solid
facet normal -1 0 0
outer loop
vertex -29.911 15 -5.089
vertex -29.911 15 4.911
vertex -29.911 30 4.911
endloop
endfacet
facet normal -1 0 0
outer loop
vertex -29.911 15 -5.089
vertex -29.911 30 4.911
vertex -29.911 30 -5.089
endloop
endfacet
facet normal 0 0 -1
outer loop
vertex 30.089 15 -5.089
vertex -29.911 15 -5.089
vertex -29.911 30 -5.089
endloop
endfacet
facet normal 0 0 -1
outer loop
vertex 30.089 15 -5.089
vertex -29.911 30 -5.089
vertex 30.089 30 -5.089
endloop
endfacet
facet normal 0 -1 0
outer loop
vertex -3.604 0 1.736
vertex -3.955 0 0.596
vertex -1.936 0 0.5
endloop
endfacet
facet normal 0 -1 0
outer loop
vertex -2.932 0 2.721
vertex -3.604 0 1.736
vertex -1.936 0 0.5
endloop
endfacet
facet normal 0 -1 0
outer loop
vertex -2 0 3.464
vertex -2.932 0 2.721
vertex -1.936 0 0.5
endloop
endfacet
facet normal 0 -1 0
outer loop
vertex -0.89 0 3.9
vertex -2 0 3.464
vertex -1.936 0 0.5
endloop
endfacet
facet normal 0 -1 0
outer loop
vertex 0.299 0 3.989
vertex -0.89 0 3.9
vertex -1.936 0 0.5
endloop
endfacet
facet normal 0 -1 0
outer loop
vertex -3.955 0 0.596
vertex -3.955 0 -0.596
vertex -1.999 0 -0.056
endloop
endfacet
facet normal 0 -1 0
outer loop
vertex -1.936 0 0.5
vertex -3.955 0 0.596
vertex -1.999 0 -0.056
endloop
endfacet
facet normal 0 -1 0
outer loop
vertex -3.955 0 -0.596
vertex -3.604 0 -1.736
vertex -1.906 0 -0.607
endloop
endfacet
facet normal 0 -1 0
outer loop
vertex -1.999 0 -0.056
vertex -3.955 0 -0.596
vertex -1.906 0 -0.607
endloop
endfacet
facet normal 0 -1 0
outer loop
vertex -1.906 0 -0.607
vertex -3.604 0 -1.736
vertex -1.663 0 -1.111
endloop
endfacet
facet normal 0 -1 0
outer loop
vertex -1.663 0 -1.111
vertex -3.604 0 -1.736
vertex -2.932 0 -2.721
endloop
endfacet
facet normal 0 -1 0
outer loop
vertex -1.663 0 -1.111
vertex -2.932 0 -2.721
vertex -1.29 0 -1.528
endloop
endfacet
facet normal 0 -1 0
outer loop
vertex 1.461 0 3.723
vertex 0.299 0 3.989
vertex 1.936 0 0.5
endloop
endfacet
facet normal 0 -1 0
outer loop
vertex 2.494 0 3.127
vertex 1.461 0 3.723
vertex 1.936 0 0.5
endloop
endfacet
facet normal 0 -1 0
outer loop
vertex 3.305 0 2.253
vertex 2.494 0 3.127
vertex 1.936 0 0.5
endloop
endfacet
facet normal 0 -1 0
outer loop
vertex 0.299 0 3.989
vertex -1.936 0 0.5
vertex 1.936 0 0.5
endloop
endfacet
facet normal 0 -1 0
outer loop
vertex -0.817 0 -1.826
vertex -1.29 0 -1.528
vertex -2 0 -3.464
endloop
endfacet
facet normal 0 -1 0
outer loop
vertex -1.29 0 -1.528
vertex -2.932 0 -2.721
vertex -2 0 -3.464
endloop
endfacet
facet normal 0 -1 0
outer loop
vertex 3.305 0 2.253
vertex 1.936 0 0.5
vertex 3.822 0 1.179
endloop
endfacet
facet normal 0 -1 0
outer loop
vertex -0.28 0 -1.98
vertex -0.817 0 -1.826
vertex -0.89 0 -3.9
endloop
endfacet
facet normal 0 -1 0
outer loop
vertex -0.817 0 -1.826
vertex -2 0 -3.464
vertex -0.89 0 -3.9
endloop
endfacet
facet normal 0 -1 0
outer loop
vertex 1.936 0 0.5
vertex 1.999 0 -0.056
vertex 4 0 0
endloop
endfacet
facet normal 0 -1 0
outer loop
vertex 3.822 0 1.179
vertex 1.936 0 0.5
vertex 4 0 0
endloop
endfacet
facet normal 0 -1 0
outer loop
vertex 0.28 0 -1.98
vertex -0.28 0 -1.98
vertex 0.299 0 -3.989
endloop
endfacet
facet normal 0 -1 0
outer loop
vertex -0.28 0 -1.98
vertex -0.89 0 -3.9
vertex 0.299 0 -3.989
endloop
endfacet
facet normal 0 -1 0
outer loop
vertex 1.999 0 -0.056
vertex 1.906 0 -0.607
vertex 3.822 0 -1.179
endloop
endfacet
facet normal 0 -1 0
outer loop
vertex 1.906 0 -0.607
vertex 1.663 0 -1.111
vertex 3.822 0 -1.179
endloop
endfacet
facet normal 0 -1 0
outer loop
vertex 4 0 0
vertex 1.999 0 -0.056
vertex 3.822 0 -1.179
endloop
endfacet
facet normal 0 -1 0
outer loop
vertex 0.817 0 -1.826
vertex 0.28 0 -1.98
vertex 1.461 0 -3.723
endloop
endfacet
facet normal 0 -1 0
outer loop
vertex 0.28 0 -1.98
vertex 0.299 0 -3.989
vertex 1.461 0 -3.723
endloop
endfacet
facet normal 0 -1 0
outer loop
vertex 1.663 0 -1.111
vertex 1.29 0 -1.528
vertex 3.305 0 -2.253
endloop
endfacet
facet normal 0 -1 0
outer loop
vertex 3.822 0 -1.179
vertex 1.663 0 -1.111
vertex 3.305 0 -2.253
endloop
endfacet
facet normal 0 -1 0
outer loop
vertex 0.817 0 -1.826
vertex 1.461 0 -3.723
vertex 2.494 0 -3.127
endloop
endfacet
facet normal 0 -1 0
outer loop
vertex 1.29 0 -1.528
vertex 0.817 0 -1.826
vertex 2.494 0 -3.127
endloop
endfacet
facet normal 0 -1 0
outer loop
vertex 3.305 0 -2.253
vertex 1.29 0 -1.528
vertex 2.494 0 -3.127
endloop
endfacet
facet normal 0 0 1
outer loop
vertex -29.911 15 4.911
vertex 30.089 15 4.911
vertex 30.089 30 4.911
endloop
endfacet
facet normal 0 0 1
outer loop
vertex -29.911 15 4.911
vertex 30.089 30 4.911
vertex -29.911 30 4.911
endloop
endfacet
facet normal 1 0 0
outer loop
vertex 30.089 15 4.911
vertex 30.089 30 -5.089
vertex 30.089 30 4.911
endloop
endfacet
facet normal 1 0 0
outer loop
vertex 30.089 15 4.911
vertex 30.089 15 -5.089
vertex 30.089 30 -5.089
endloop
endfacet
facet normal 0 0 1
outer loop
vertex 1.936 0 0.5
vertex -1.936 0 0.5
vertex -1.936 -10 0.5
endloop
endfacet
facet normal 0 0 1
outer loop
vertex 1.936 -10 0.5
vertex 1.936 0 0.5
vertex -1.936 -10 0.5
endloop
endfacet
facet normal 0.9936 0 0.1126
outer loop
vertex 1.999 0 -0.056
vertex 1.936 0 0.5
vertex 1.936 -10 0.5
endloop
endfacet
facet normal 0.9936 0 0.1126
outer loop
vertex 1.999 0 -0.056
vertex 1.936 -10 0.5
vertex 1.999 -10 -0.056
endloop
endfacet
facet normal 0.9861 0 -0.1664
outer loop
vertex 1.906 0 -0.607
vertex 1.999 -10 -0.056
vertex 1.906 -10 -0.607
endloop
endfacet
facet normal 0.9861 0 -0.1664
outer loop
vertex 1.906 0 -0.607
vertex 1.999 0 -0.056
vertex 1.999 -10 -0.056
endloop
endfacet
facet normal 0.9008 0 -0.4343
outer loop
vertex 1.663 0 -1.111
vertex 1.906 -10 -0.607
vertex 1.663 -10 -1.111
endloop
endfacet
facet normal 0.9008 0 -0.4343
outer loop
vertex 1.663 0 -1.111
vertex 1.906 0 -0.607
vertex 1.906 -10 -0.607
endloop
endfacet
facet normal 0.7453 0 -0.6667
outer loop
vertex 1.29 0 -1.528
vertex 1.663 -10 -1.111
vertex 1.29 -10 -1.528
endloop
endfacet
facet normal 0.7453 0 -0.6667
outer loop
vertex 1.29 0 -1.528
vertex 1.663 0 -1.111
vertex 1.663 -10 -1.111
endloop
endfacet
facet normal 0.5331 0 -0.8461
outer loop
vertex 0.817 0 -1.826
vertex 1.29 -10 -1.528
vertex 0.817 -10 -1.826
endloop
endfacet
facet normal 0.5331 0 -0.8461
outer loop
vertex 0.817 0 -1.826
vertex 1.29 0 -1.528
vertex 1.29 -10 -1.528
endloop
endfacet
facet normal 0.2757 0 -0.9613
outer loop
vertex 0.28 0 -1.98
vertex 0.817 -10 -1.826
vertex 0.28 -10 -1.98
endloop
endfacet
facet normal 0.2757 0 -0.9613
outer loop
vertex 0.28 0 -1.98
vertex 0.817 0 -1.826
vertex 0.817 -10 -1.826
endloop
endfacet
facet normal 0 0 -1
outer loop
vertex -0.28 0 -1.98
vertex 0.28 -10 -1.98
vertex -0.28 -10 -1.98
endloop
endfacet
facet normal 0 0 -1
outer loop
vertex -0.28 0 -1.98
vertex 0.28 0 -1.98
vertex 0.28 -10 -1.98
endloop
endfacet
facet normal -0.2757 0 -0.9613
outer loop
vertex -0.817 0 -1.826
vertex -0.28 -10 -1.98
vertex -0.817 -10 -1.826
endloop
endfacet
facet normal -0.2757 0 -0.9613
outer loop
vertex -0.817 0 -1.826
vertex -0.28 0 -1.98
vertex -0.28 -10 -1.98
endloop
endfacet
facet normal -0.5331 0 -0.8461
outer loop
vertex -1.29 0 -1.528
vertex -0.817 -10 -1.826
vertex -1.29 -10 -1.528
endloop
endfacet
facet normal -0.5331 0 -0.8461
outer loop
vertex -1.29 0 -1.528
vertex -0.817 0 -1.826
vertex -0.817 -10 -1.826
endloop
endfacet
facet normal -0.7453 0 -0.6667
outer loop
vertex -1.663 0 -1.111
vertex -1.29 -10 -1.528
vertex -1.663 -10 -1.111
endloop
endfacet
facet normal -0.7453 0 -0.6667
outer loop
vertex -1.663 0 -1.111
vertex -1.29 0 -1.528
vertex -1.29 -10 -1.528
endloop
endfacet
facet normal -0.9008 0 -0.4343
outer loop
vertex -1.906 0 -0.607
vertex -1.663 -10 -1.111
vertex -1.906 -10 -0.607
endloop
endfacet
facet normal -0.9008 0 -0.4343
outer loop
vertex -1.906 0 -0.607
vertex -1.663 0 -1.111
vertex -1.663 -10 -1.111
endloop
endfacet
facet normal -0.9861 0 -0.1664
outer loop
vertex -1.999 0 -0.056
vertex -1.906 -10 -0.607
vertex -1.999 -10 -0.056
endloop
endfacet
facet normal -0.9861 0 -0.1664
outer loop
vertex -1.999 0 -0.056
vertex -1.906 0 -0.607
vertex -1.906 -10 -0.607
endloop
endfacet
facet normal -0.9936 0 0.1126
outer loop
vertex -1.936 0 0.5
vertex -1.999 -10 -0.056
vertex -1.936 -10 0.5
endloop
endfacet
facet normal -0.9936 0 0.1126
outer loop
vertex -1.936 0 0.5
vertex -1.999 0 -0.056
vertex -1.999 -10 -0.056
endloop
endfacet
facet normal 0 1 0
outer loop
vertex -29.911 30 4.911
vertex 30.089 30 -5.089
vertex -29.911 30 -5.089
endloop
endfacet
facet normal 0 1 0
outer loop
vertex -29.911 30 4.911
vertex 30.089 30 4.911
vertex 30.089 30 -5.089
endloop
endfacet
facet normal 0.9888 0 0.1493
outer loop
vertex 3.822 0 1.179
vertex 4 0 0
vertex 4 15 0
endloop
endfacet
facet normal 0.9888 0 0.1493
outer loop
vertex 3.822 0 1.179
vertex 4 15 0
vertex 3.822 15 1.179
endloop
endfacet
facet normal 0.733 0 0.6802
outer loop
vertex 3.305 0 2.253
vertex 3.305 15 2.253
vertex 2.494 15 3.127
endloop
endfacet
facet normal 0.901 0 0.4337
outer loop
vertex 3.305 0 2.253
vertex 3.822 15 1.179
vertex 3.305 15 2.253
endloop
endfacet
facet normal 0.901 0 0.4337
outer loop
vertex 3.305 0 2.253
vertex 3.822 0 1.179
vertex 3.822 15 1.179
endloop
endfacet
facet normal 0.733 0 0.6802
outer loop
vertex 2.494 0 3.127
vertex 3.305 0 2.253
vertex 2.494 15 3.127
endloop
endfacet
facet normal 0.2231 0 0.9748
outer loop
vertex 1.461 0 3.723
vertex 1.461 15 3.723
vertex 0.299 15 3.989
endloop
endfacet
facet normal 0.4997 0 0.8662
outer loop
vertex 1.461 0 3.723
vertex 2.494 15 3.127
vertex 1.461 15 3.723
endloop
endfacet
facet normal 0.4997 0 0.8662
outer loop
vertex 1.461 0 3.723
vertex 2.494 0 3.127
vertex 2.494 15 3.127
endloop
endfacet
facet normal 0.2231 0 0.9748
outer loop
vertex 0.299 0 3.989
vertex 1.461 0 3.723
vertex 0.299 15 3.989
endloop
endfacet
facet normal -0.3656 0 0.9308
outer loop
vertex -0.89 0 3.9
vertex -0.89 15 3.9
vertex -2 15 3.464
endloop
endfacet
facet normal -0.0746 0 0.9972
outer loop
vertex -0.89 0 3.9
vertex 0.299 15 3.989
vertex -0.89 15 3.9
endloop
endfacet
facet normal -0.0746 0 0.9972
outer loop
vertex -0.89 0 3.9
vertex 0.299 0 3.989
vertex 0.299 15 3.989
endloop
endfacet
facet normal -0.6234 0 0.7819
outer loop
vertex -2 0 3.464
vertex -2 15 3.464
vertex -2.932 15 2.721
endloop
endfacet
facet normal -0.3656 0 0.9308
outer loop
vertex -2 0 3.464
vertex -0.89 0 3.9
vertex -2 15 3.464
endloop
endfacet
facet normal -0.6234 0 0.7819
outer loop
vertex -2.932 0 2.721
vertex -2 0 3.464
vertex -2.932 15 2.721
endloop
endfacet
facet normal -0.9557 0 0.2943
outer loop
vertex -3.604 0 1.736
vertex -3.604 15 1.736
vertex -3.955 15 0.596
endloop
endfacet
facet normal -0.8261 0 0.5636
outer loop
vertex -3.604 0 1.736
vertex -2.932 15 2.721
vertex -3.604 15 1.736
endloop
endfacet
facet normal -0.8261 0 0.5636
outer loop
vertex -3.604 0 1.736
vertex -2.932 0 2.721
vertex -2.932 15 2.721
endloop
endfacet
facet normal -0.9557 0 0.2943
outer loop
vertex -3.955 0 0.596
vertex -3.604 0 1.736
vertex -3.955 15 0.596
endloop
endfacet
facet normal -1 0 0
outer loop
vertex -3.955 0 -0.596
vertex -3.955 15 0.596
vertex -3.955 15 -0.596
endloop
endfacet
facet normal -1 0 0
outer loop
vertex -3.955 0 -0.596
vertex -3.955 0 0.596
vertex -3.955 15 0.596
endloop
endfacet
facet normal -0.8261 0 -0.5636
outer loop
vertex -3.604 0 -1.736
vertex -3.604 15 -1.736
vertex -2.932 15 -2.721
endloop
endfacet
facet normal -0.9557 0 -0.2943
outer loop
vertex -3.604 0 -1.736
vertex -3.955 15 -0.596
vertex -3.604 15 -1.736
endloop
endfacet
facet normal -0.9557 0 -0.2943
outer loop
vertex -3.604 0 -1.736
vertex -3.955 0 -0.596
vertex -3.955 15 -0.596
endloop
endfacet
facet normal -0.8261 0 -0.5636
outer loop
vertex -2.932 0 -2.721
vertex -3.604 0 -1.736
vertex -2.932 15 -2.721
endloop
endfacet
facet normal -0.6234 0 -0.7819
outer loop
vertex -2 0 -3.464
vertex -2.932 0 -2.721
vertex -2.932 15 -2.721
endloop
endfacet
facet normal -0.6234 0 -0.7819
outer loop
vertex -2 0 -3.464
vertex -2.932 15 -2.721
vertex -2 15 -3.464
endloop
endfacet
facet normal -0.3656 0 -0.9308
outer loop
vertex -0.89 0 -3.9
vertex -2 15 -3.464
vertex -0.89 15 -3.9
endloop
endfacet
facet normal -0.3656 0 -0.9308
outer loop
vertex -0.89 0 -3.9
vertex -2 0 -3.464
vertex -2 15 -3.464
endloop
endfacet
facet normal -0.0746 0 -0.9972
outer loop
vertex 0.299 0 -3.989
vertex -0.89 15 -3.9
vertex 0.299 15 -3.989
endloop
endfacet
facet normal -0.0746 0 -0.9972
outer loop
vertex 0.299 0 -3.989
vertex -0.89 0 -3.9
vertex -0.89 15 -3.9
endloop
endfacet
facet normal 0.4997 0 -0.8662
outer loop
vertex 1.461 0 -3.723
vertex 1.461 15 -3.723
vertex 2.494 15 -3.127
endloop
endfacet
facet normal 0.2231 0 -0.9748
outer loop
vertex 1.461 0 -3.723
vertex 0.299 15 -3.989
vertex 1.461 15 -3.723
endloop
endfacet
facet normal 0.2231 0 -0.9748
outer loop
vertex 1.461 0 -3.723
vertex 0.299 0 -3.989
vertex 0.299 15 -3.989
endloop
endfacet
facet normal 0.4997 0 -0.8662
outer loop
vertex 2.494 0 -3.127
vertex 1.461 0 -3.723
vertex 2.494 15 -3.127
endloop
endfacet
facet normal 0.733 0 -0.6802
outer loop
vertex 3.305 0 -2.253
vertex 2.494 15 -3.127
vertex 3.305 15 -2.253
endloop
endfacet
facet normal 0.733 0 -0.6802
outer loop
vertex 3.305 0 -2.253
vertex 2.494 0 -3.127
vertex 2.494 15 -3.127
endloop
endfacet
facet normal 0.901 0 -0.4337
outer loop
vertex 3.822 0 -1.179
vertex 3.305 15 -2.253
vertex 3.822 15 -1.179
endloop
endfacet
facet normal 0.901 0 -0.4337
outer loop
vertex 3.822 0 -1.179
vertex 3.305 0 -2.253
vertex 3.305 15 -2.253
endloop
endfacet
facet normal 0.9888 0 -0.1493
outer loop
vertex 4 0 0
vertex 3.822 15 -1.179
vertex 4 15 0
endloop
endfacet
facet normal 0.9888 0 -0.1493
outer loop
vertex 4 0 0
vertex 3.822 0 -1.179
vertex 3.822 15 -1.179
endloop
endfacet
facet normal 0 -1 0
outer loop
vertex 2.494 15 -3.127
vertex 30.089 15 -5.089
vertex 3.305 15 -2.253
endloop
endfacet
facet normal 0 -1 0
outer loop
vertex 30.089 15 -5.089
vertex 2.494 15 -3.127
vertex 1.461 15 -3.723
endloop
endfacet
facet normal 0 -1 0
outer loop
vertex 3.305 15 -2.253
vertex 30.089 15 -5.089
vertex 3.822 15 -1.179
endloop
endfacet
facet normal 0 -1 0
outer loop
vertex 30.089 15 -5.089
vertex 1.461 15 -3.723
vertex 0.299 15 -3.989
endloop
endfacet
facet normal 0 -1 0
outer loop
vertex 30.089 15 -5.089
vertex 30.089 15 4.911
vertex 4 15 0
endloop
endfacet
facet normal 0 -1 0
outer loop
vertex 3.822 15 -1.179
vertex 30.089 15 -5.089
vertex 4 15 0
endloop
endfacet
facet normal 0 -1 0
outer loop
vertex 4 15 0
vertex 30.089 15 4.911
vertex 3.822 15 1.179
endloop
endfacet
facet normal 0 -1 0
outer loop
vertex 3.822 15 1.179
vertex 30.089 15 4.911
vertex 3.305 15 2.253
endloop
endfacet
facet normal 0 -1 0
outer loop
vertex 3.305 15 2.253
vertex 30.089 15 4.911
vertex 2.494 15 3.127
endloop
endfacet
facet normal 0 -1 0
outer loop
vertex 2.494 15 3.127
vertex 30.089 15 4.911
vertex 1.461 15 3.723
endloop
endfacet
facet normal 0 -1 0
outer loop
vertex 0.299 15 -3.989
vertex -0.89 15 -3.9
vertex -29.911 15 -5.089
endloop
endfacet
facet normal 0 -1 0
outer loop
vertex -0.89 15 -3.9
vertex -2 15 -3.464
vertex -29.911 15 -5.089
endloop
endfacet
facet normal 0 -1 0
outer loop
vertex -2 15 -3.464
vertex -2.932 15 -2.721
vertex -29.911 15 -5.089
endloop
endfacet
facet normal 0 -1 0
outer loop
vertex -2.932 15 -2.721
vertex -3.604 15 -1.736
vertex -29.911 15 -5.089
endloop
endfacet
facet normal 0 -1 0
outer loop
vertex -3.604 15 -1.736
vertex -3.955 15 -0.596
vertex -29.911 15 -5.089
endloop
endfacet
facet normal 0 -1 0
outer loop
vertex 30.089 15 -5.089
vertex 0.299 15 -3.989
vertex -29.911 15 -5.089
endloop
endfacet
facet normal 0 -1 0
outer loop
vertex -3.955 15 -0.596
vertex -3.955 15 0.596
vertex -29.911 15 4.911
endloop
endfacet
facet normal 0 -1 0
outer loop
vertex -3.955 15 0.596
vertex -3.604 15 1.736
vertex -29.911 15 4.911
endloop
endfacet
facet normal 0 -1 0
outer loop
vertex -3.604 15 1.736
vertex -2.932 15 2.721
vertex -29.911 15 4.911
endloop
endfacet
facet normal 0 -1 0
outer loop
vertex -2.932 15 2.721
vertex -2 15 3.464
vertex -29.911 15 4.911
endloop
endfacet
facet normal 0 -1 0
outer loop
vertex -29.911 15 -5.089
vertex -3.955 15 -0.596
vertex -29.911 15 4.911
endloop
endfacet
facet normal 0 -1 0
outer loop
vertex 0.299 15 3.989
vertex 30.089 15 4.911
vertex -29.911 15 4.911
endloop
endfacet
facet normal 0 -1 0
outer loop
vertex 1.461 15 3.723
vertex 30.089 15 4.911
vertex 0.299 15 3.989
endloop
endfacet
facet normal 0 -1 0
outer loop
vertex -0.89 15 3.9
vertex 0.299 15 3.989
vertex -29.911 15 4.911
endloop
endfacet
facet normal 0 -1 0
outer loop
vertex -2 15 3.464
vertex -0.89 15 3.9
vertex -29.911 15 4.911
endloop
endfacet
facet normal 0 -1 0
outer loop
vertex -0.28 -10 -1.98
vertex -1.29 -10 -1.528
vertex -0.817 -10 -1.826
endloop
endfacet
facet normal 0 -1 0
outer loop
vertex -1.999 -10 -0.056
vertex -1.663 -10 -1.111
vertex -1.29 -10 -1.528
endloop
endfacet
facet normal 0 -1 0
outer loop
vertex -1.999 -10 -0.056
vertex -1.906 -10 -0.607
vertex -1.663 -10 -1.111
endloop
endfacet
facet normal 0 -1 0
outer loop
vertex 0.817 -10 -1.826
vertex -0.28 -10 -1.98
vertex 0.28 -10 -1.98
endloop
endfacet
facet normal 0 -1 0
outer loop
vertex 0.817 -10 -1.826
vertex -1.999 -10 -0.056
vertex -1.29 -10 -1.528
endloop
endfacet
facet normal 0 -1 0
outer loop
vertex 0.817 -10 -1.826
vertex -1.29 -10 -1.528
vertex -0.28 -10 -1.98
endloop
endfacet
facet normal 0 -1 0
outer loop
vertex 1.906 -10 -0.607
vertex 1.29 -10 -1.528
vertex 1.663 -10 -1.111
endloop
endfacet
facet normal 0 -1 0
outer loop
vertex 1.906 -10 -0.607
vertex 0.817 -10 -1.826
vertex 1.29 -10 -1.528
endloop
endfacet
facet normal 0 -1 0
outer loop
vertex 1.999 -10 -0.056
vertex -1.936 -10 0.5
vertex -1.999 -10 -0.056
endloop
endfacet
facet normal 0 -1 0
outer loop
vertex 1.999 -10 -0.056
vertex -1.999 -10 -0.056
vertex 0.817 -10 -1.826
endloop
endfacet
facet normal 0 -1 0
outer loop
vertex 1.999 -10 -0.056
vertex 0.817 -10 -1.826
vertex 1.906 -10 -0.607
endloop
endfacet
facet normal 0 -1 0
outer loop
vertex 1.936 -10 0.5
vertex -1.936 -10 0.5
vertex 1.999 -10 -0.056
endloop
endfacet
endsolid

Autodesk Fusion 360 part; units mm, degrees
sketch "Esquisse1" plane through (0, 0, 0) normal (0, 1, 0) x (1, 0, 0)
  circle A0 centre (0, 0) radius 4
  dimension "d1" = 8
extrude "Extrusion1" add sketch "Esquisse1" along normal blind 15
sketch "Esquisse2" plane through (0, 15, 0) normal (0, 1, 0) x (-1, 0, 0)
  circle A0 centre (0, 0) radius 4
  line L0 (-30.089, 4.9107) -> (29.911, 4.9107)
  line L1 (29.911, 4.9107) -> (29.911, -5.0893)
  line L2 (29.911, -5.0893) -> (-30.089, -5.0893)
  line L3 (-30.089, -5.0893) -> (-30.089, 4.9107)
  point P0 (-0.089, -5.0893)
  dimension "d12" = 60
  dimension "d13" = 10
extrude "Extrusion2" add sketch "Esquisse2" along normal blind 15 contours A0 | L0 L1 L2 L3
sketch "Esquisse5" plane through (0, 0, 0) normal (0, -1, 0) x (1, 0, 0)
  circle A0 centre (0, 0) radius 4
  circle A1 centre (0, 0) radius 2
  dimension "d14" = 4
extrude "Extrusion4" add sketch "Esquisse5" along normal blind 10 contours A1
sketch "Esquisse7" plane through (0, 0, 0) normal (1, 0, 0) x (0, 1, 0)
  line L0 (-10, 2) -> (0, 2)
  line L1 (0, 2) -> (0, 0.5)
  line L2 (0, 0.5) -> (-10, 0.5)
  line L3 (-10, 0.5) -> (-10, 2)
  dimension "d19" = 10
  dimension "d20" = 1.5
extrude "Extrusion5" cut sketch "Esquisse7" along normal blind 3.5 and the other way blind 3
